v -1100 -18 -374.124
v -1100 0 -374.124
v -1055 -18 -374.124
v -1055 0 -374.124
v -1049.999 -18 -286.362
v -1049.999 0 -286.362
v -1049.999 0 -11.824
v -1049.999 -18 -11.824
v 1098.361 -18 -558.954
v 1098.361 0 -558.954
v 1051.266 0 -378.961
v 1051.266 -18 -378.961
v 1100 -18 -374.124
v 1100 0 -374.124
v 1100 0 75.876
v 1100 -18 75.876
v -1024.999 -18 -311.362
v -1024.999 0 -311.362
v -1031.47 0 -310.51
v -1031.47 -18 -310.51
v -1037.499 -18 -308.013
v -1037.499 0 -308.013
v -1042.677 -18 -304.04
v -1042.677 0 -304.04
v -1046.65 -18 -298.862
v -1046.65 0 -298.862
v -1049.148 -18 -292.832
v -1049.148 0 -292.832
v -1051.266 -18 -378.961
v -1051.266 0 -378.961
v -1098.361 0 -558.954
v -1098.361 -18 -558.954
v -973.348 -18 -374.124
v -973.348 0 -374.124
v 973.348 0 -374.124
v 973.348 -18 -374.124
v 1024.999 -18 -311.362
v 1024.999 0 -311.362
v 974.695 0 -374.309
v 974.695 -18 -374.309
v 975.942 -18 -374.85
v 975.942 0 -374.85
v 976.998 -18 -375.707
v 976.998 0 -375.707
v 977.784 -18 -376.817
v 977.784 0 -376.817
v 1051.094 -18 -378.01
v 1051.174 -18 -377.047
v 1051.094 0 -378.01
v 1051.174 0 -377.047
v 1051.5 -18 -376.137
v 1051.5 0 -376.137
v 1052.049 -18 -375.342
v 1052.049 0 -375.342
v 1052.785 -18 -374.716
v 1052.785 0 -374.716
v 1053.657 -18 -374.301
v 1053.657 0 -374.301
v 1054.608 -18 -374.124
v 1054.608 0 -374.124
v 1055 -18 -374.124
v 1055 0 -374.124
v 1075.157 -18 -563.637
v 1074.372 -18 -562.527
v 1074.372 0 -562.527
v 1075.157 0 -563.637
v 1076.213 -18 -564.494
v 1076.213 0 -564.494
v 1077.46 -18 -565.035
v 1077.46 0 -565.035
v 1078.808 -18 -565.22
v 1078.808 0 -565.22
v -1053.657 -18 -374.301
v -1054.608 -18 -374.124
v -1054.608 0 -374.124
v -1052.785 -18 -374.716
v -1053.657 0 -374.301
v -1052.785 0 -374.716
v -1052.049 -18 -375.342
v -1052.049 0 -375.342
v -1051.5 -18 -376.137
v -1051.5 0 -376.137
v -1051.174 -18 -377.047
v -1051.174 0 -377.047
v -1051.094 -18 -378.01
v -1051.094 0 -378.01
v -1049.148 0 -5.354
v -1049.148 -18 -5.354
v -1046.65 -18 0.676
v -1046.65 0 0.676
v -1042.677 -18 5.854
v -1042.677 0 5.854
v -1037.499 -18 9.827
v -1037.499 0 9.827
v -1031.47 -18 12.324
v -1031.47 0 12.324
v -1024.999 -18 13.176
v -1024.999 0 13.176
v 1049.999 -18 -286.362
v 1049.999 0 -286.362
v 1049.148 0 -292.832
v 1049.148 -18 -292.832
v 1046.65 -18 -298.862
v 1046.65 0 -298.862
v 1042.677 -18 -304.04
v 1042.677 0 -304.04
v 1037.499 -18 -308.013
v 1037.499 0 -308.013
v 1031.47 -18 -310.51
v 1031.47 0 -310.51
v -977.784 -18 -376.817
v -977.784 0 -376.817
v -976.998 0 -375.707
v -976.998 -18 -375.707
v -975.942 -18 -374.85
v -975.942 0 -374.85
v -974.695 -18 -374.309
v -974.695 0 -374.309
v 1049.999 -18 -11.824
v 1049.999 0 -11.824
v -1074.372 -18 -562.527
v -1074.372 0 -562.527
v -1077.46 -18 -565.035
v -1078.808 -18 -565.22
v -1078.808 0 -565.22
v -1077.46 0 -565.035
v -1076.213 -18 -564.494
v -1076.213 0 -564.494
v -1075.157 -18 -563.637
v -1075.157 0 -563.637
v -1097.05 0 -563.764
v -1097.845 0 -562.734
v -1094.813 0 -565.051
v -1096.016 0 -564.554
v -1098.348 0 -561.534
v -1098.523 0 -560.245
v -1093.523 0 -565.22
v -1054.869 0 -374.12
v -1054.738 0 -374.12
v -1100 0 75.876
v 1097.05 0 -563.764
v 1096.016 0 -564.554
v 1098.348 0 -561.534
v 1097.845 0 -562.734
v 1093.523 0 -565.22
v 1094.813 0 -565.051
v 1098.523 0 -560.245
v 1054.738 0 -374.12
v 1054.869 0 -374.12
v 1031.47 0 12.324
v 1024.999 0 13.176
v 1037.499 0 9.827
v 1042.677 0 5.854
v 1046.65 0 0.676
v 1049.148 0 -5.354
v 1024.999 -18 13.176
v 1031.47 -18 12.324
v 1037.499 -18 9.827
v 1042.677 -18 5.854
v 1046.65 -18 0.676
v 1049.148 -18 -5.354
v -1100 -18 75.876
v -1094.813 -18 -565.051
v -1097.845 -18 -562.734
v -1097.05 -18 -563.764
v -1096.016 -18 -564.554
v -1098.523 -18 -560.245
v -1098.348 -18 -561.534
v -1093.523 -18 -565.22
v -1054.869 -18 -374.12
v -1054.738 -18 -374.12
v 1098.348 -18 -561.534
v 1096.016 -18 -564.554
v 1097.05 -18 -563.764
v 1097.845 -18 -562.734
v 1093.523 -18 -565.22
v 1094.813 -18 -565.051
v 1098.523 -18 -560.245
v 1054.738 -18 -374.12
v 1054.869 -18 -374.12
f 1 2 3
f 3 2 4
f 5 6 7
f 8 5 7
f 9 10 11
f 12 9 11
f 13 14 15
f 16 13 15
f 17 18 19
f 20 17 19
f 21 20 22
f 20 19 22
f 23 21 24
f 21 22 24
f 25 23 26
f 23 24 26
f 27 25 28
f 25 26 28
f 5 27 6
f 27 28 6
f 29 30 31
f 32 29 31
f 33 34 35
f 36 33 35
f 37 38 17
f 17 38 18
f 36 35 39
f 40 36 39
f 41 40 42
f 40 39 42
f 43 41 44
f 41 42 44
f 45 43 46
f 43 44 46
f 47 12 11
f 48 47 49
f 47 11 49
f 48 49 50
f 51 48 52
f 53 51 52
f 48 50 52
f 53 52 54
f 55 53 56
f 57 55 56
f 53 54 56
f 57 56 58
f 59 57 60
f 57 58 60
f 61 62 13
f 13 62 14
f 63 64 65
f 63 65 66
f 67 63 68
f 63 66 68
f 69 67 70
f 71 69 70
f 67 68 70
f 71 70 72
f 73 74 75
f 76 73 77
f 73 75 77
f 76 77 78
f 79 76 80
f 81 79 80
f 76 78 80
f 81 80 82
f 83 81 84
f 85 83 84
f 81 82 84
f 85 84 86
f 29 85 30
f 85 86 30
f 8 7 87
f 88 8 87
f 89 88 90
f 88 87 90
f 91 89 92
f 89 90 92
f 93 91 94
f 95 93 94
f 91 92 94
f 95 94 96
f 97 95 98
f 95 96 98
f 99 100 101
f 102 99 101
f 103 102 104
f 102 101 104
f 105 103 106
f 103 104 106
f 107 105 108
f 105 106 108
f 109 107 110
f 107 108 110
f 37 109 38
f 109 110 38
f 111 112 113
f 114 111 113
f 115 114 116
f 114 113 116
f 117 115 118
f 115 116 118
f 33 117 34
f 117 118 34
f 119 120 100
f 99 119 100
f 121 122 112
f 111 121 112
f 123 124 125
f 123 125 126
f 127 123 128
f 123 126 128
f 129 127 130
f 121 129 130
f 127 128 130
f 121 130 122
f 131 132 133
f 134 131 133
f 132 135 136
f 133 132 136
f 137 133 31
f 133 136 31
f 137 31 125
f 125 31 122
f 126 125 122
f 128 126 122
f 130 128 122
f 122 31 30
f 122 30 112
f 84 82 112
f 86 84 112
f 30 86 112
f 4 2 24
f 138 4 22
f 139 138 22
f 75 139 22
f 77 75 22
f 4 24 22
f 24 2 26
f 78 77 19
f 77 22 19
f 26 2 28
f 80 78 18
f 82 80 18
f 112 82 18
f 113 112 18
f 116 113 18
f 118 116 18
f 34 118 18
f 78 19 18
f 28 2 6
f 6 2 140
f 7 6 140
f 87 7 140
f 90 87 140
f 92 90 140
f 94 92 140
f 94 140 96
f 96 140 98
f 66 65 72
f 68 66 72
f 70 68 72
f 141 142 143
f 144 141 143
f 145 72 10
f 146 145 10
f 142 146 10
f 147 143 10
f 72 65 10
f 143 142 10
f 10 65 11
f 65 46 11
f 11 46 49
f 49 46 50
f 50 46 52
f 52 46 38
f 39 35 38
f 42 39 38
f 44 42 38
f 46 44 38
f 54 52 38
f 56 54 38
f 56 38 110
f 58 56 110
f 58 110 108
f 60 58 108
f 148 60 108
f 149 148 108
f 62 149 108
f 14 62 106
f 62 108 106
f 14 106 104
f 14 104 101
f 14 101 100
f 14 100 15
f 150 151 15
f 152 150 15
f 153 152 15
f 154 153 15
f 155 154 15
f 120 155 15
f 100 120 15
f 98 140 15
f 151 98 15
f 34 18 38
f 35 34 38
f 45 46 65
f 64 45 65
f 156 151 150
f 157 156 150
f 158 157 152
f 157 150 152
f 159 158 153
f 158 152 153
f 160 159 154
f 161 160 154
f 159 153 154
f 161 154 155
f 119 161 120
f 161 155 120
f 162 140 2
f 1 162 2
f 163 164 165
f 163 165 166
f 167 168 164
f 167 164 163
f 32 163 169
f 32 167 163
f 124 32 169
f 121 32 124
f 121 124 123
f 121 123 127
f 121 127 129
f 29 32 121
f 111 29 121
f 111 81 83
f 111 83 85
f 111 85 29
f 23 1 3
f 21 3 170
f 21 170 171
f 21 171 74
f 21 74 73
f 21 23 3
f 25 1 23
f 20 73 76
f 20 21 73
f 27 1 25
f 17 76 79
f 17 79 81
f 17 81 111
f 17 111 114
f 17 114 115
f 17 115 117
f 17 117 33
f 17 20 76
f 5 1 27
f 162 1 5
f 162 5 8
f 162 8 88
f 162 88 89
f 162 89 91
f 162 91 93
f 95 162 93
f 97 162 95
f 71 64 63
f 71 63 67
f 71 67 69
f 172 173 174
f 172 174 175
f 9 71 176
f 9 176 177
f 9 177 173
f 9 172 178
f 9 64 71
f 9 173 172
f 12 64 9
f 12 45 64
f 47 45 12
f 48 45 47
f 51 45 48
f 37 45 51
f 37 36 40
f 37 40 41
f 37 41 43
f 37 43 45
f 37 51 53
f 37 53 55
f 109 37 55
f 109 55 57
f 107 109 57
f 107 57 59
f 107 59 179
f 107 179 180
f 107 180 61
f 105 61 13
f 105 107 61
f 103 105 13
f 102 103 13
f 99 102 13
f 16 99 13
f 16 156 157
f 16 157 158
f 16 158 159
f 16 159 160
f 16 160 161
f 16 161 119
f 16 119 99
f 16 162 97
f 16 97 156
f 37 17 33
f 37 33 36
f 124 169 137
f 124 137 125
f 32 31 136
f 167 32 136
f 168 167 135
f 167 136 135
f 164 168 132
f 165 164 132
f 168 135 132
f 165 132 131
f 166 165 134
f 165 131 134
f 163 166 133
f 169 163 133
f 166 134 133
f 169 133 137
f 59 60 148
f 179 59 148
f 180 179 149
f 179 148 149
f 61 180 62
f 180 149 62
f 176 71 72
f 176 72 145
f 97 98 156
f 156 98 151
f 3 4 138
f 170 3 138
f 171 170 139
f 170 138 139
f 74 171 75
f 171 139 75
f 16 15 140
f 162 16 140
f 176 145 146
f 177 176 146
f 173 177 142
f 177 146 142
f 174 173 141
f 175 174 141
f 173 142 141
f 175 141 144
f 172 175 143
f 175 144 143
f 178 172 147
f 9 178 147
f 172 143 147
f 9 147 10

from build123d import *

# Parameters (mm, degrees)
F0_W     = 9
F0_H     = 9
F0_H_2   = 432
F1_DEPTH = 18


# Not quite as in the source:
# - a feature names something its author has since deleted; it is built from what else it names


with BuildPart() as f1:
    # F0 (on Front) → F1 (new body)
    with BuildSketch(Plane.XZ):
        with Locations((-1095.5, 71.3756743552)):
            Rectangle(F0_W, F0_H)
        with BuildLine():
            Line((-973.3476458471, -374.1243256448), (-1054.6076226562, -374.1243256448))
            ThreePointArc((-1054.6076226562, -374.1243256448), (-1051.7483407187, -375.721921149), (-1051.265639742, -378.9614896944))
            Line((-1051.265639742, -378.9614896944), (-1098.3606008427, -558.954299013))
            ThreePointArc((-1098.3606008427, -558.954299013), (-1097.4812264988, -563.2754093644), (-1093.523436793, -565.219938755))
            Line((-1093.523436793, -565.219938755), (-1078.8076104242, -565.219938755))
            ThreePointArc((-1078.8076104242, -565.219938755), (-1076.2129629213, -564.4940239596), (-1074.371712623, -562.5270604893))
            Line((-1074.371712623, -562.5270604893), (-977.7835436484, -376.8172039105))
            ThreePointArc((-977.7835436484, -376.8172039105), (-975.94229335, -374.8502404402), (-973.3476458471, -374.1243256448))
        make_face()
        with BuildLine():
            Line((0, -365.1243256448), (-1091, -365.1243256448))
            Line((-1091, -365.1243256448), (-1091, -374.1243256448))
            Line((-1091, -374.1243256448), (-1055, -374.1243256448))
            ThreePointArc((-1055, -374.1243256448), (-1054.8038113281, -374.1191399972), (-1054.6076226562, -374.1243256448))
            Line((-1054.6076226562, -374.1243256448), (-973.3476458471, -374.1243256448))
            Line((-973.3476458471, -374.1243256448), (0, -374.1243256448))
            Line((0, -374.1243256448), (973.3476458471, -374.1243256448))
            Line((973.3476458471, -374.1243256448), (1054.6076226562, -374.1243256448))
            ThreePointArc((1054.6076226562, -374.1243256448), (1054.8038113281, -374.1191399972), (1055, -374.1243256448))
            Line((1055, -374.1243256448), (1100, -374.1243256448))
            Line((1100, -374.1243256448), (1100, 66.8756743552))
            Line((1100, 66.8756743552), (1091, 66.8756743552))
            Line((1091, 66.8756743552), (1091, -365.0378882885))
            Line((1091, -365.0378882885), (1091, -365.1243256448))
            Line((1091, -365.1243256448), (0, -365.1243256448))
        make_face()
        Polygon((0, 75.8756743552), (-1091, 75.8756743552), (-1091, 66.8756743552), (0, 66.8756743552), (1091, 66.8756743552), (1091, 75.8756743552), align=None)
        with Locations((-1095.5, -149.1243256448)):
            Rectangle(F0_W, F0_H_2)
        with Locations((-1095.5, -369.6243256448)):
            Rectangle(F0_W, F0_H)
        with Locations((1095.5, 71.3756743552)):
            Rectangle(F0_W, F0_H)
        with BuildLine():
            ThreePointArc((1051.265639742, -378.9614896944), (1051.7483407187, -375.721921149), (1054.6076226562, -374.1243256448))
            Line((1054.6076226562, -374.1243256448), (973.3476458471, -374.1243256448))
            ThreePointArc((973.3476458471, -374.1243256448), (975.94229335, -374.8502404402), (977.7835436484, -376.8172039105))
            Line((977.7835436484, -376.8172039105), (1074.371712623, -562.5270604893))
            ThreePointArc((1074.371712623, -562.5270604893), (1076.2129629213, -564.4940239596), (1078.8076104242, -565.219938755))
            Line((1078.8076104242, -565.219938755), (1093.523436793, -565.219938755))
            ThreePointArc((1093.523436793, -565.219938755), (1097.4812264988, -563.2754093644), (1098.3606008427, -558.954299013))
            Line((1098.3606008427, -558.954299013), (1051.265639742, -378.9614896944))
        make_face()
        Polygon((0, 66.8756743552), (-1091, 66.8756743552), (-1091, -365.1243256448), (0, -365.1243256448), (1091, -365.1243256448), (1091, -365.0378882885), (1091, 66.8756743552), align=None)
        with BuildLine():
            Line((-1049.9993757457, -21.1739316583), (-1049.9993757457, -21.1230870336))
            Line((-1049.9993757457, -21.1230870336), (-1049.9993757457, -11.824025))
            ThreePointArc((-1049.9993757457, -11.824025), (-1042.6770452754, 5.8536445296), (-1024.9993757457, 13.175975))
            Line((-1024.9993757457, 13.175975), (1024.9993757457, 13.175975))
            ThreePointArc((1024.9993757457, 13.175975), (1042.6770452754, 5.8536445296), (1049.9993757457, -11.824025))
            Line((1049.9993757457, -11.824025), (1049.9993757457, -286.3619962875))
            ThreePointArc((1049.9993757457, -286.3619962875), (1042.6770452754, -304.0396658171), (1024.9993757457, -311.3619962875))
            Line((1024.9993757457, -311.3619962875), (-1024.9993757457, -311.3619962875))
            ThreePointArc((-1024.9993757457, -311.3619962875), (-1042.6770452754, -304.0396658171), (-1049.9993757457, -286.3619962875))
            Line((-1049.9993757457, -286.3619962875), (-1049.9993757457, -21.1739316583))
        make_face(mode=Mode.SUBTRACT)
    extrude(amount=F1_DEPTH)


solid = f1.part
